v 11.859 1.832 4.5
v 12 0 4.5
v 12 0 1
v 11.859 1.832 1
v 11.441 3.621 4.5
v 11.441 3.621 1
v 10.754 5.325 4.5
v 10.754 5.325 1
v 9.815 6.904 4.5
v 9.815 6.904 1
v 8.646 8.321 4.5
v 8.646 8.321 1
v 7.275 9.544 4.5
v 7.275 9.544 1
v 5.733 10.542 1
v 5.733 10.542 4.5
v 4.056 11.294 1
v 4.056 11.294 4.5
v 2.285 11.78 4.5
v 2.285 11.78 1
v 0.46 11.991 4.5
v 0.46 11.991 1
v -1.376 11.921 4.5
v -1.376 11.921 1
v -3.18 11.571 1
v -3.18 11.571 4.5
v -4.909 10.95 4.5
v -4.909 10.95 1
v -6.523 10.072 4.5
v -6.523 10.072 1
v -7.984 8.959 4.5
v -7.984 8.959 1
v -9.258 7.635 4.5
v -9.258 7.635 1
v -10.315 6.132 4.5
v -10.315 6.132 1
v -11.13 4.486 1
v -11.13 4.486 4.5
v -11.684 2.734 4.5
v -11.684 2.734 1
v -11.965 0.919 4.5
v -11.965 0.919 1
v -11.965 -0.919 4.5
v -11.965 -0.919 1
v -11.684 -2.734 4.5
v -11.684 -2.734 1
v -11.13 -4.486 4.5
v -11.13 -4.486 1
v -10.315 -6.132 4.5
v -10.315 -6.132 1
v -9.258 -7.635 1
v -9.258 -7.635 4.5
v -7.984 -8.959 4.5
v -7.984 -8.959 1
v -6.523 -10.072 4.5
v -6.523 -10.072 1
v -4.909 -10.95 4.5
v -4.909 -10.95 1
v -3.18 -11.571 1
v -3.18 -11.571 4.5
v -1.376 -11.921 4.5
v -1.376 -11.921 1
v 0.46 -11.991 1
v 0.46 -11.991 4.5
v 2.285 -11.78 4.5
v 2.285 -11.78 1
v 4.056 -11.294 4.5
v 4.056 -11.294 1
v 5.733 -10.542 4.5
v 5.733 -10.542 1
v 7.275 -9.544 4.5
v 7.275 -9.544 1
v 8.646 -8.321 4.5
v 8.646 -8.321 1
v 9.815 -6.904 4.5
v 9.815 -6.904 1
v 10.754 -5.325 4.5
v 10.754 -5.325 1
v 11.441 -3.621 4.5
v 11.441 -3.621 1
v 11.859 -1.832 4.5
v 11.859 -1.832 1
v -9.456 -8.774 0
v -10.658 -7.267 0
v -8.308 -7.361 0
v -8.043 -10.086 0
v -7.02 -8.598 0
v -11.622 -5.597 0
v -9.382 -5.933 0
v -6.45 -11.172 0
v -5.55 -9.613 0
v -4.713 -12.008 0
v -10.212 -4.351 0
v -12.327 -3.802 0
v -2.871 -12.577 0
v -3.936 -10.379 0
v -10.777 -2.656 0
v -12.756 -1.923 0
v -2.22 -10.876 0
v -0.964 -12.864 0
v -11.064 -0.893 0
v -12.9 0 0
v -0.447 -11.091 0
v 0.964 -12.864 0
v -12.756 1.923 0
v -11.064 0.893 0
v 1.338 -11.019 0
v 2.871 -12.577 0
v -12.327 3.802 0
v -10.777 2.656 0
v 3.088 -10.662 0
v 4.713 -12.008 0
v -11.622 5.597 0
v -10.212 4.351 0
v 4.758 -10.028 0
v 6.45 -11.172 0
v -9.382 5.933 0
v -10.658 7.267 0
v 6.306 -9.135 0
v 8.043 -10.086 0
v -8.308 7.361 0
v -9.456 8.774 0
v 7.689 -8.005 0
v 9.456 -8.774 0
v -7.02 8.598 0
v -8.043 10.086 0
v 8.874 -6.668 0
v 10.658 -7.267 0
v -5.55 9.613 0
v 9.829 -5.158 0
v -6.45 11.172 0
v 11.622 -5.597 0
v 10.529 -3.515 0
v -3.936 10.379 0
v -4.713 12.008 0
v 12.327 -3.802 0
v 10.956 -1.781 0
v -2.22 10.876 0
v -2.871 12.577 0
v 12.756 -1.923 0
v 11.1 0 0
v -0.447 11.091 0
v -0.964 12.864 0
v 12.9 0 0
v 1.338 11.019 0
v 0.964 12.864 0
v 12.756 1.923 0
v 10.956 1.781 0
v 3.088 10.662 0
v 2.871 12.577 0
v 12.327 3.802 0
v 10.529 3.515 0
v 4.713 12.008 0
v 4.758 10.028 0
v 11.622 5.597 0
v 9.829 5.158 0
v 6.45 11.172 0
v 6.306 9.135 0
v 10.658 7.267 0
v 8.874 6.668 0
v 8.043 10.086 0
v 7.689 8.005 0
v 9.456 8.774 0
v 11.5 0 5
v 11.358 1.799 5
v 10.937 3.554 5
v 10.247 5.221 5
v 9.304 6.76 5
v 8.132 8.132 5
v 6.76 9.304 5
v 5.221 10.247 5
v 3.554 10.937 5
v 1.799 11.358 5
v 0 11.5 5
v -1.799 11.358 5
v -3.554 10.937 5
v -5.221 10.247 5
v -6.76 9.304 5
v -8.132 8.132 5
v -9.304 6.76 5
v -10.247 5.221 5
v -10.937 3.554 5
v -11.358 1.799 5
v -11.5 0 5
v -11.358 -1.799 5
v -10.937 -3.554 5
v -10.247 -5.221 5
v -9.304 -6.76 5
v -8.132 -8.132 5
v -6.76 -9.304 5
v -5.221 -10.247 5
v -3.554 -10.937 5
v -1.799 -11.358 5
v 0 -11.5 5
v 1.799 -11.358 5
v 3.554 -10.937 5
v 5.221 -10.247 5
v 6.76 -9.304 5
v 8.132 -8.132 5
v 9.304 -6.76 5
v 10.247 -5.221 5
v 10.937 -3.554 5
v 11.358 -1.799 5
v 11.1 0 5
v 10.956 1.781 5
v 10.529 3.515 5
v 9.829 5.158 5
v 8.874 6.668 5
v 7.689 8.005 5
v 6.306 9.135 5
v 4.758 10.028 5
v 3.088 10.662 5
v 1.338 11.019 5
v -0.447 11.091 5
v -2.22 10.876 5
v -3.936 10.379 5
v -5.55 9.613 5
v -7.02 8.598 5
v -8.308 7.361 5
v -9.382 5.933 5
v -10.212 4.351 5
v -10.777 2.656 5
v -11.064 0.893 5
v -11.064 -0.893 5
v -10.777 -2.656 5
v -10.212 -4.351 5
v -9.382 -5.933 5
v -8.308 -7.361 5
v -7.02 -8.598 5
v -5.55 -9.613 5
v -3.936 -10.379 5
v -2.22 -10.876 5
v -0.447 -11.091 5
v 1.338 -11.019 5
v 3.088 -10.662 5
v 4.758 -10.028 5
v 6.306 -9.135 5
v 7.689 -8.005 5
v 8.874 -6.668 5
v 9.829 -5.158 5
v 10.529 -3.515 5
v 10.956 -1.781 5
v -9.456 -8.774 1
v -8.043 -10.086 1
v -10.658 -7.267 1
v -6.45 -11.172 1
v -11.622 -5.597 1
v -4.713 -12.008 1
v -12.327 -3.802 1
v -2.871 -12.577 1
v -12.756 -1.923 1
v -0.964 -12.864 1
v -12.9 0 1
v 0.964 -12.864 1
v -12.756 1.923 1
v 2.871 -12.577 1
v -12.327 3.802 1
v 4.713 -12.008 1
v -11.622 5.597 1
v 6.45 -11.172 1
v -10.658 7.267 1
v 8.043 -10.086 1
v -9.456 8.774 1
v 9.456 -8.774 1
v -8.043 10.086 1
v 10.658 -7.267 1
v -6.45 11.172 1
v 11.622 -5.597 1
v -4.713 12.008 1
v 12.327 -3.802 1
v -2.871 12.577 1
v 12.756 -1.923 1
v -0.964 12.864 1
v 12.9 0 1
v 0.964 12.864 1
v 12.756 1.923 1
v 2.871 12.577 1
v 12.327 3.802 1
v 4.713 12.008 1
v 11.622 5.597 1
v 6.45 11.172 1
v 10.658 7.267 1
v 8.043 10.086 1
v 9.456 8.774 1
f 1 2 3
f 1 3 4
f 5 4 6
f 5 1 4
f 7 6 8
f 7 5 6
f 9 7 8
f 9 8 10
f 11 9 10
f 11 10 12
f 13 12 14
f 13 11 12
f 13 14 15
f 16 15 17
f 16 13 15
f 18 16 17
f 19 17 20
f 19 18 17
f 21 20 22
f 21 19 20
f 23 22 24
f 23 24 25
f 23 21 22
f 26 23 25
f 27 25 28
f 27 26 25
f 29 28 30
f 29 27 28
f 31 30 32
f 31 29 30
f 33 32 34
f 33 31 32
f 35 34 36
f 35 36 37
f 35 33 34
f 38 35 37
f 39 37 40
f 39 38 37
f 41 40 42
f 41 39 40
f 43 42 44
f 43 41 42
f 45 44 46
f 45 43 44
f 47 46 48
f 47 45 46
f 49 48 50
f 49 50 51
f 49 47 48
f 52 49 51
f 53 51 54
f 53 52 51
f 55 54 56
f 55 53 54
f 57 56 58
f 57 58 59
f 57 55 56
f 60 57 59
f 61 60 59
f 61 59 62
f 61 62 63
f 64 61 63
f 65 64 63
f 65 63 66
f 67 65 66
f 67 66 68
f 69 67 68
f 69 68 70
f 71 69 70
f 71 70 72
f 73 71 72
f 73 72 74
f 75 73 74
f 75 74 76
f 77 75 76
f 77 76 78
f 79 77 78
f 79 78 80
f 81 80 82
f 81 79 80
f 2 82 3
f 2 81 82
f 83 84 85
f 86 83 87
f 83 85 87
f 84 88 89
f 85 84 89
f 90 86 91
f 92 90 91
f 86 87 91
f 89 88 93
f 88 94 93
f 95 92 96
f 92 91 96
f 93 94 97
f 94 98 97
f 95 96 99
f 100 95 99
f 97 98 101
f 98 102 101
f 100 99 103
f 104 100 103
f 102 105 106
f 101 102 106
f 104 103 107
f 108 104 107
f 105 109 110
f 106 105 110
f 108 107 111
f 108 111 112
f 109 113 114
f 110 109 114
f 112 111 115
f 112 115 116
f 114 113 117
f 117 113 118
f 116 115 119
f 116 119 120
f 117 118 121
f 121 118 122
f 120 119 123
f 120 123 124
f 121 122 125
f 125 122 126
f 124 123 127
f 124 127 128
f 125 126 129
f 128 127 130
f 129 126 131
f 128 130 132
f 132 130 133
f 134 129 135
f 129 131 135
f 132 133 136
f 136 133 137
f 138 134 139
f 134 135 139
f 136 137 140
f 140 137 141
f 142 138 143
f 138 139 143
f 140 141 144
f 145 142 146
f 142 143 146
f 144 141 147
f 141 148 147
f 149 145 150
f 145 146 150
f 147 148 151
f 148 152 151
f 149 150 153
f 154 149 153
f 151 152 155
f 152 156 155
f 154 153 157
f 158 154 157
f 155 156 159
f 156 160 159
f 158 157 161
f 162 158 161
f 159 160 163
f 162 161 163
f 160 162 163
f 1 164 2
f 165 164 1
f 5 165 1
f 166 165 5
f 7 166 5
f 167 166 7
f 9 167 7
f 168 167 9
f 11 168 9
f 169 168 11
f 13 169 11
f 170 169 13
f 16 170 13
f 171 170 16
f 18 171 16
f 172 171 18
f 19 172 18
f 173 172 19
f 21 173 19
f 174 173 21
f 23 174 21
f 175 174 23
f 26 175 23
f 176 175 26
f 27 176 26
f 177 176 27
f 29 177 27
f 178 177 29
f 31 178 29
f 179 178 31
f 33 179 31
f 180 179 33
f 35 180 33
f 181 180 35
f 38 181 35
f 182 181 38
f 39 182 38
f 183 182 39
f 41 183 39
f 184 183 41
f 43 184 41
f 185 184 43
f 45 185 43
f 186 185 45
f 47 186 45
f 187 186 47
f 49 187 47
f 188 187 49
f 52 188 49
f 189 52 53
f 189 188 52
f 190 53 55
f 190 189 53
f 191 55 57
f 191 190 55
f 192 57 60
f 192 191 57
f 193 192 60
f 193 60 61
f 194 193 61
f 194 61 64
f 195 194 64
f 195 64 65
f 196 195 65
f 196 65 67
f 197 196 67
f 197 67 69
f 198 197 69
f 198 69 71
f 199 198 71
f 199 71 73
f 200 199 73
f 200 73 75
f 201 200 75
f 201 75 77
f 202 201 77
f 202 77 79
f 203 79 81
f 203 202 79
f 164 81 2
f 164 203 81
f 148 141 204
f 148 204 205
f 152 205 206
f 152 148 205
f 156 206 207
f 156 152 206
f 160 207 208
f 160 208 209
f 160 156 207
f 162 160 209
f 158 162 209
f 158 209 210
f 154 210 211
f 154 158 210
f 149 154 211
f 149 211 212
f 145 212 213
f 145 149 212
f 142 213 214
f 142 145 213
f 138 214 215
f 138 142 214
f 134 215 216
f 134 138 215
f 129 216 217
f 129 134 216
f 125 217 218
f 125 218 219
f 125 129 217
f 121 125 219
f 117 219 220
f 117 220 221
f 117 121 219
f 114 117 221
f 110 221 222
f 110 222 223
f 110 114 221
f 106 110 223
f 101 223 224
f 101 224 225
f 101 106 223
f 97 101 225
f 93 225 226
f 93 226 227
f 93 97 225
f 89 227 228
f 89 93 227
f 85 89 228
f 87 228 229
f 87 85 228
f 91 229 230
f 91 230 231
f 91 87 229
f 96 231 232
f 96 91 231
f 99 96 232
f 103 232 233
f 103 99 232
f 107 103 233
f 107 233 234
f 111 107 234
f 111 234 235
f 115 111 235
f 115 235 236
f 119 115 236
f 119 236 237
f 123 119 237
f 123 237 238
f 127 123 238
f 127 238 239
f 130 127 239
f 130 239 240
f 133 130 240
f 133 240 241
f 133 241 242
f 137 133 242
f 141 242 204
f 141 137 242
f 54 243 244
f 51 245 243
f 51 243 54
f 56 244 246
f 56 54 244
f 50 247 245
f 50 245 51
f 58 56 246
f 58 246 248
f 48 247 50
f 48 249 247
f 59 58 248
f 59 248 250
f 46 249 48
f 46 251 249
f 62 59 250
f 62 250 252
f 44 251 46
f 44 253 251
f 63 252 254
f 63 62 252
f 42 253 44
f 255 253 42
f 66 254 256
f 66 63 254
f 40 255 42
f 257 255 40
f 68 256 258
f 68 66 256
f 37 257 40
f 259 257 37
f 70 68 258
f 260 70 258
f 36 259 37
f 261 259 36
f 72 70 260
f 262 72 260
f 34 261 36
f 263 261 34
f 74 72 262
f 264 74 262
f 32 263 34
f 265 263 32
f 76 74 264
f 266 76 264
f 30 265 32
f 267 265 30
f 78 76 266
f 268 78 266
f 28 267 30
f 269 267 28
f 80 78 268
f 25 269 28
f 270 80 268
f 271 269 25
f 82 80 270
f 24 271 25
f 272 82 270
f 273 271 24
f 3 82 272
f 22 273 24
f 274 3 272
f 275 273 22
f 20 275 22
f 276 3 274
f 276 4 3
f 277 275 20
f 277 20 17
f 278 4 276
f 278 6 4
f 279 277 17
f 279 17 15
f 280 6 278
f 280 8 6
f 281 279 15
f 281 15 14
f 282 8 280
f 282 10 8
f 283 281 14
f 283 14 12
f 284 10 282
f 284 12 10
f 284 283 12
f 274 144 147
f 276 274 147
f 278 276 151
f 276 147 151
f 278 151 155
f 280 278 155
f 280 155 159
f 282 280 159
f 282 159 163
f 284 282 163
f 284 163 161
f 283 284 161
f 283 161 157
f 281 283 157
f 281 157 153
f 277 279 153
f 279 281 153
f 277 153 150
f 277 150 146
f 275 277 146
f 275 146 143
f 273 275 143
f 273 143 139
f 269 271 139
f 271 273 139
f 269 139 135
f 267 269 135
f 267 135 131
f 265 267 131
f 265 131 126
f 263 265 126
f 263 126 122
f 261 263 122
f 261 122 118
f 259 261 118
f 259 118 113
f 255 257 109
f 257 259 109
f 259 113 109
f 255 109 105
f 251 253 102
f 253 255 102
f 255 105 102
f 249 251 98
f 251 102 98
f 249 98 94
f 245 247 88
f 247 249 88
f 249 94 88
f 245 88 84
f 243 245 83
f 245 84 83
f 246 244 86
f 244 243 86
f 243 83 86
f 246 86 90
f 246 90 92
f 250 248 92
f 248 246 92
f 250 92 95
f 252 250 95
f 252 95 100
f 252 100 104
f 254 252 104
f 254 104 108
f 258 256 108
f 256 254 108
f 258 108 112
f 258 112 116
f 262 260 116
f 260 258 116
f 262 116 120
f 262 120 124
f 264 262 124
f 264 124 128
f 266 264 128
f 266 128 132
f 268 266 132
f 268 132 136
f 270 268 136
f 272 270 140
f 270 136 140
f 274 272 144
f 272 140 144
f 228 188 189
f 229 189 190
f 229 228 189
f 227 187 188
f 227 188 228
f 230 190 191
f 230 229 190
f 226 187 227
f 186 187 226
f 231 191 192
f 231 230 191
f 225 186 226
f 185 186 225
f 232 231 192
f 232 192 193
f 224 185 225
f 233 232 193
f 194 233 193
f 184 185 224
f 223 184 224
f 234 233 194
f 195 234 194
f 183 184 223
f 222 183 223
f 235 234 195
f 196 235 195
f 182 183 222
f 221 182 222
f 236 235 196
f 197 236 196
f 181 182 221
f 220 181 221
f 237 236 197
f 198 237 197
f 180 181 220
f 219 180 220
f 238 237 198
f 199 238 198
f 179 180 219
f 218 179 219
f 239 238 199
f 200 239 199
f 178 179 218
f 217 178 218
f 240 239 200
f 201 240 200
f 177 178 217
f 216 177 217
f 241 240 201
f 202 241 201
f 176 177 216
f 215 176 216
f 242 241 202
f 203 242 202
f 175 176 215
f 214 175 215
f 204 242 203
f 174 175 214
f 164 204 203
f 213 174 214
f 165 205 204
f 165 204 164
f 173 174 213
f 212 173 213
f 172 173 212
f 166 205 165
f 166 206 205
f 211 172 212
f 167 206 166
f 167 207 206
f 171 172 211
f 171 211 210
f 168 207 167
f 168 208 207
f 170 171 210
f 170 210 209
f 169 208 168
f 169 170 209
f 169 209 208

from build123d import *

# Parameters (mm, degrees)
SKETCH_1_R          = 12.9
SKETCH_1_R_2        = 11.1
EXTRUDE_1_DEPTH     = 5
SKETCH_3_R          = 16.662816376
SKETCH_3_R_2        = 12
CUT_EXTRUDE_1_DEPTH = 4
CHAMFER_1_SIZE      = 0.5


with BuildPart() as part:
    # 草图1 → 凸台-拉伸1 (new body)
    with BuildSketch(Plane.XY):
        Circle(SKETCH_1_R)
        Circle(SKETCH_1_R_2, mode=Mode.SUBTRACT)
    extrude(amount=EXTRUDE_1_DEPTH)

    # 草图3 → 切除-拉伸1 (cut)
    with BuildSketch(Plane.XY.offset(5)):
        Circle(SKETCH_3_R)
        Circle(SKETCH_3_R_2, mode=Mode.SUBTRACT)
    extrude(amount=-CUT_EXTRUDE_1_DEPTH, mode=Mode.SUBTRACT)

    # 倒角1
    chamfer_1_edges = [part.edges().sort_by_distance(p)[0] for p in [
        (-12, 0, 5),
    ]]
    chamfer(chamfer_1_edges, length=CHAMFER_1_SIZE)


solid = part.part
